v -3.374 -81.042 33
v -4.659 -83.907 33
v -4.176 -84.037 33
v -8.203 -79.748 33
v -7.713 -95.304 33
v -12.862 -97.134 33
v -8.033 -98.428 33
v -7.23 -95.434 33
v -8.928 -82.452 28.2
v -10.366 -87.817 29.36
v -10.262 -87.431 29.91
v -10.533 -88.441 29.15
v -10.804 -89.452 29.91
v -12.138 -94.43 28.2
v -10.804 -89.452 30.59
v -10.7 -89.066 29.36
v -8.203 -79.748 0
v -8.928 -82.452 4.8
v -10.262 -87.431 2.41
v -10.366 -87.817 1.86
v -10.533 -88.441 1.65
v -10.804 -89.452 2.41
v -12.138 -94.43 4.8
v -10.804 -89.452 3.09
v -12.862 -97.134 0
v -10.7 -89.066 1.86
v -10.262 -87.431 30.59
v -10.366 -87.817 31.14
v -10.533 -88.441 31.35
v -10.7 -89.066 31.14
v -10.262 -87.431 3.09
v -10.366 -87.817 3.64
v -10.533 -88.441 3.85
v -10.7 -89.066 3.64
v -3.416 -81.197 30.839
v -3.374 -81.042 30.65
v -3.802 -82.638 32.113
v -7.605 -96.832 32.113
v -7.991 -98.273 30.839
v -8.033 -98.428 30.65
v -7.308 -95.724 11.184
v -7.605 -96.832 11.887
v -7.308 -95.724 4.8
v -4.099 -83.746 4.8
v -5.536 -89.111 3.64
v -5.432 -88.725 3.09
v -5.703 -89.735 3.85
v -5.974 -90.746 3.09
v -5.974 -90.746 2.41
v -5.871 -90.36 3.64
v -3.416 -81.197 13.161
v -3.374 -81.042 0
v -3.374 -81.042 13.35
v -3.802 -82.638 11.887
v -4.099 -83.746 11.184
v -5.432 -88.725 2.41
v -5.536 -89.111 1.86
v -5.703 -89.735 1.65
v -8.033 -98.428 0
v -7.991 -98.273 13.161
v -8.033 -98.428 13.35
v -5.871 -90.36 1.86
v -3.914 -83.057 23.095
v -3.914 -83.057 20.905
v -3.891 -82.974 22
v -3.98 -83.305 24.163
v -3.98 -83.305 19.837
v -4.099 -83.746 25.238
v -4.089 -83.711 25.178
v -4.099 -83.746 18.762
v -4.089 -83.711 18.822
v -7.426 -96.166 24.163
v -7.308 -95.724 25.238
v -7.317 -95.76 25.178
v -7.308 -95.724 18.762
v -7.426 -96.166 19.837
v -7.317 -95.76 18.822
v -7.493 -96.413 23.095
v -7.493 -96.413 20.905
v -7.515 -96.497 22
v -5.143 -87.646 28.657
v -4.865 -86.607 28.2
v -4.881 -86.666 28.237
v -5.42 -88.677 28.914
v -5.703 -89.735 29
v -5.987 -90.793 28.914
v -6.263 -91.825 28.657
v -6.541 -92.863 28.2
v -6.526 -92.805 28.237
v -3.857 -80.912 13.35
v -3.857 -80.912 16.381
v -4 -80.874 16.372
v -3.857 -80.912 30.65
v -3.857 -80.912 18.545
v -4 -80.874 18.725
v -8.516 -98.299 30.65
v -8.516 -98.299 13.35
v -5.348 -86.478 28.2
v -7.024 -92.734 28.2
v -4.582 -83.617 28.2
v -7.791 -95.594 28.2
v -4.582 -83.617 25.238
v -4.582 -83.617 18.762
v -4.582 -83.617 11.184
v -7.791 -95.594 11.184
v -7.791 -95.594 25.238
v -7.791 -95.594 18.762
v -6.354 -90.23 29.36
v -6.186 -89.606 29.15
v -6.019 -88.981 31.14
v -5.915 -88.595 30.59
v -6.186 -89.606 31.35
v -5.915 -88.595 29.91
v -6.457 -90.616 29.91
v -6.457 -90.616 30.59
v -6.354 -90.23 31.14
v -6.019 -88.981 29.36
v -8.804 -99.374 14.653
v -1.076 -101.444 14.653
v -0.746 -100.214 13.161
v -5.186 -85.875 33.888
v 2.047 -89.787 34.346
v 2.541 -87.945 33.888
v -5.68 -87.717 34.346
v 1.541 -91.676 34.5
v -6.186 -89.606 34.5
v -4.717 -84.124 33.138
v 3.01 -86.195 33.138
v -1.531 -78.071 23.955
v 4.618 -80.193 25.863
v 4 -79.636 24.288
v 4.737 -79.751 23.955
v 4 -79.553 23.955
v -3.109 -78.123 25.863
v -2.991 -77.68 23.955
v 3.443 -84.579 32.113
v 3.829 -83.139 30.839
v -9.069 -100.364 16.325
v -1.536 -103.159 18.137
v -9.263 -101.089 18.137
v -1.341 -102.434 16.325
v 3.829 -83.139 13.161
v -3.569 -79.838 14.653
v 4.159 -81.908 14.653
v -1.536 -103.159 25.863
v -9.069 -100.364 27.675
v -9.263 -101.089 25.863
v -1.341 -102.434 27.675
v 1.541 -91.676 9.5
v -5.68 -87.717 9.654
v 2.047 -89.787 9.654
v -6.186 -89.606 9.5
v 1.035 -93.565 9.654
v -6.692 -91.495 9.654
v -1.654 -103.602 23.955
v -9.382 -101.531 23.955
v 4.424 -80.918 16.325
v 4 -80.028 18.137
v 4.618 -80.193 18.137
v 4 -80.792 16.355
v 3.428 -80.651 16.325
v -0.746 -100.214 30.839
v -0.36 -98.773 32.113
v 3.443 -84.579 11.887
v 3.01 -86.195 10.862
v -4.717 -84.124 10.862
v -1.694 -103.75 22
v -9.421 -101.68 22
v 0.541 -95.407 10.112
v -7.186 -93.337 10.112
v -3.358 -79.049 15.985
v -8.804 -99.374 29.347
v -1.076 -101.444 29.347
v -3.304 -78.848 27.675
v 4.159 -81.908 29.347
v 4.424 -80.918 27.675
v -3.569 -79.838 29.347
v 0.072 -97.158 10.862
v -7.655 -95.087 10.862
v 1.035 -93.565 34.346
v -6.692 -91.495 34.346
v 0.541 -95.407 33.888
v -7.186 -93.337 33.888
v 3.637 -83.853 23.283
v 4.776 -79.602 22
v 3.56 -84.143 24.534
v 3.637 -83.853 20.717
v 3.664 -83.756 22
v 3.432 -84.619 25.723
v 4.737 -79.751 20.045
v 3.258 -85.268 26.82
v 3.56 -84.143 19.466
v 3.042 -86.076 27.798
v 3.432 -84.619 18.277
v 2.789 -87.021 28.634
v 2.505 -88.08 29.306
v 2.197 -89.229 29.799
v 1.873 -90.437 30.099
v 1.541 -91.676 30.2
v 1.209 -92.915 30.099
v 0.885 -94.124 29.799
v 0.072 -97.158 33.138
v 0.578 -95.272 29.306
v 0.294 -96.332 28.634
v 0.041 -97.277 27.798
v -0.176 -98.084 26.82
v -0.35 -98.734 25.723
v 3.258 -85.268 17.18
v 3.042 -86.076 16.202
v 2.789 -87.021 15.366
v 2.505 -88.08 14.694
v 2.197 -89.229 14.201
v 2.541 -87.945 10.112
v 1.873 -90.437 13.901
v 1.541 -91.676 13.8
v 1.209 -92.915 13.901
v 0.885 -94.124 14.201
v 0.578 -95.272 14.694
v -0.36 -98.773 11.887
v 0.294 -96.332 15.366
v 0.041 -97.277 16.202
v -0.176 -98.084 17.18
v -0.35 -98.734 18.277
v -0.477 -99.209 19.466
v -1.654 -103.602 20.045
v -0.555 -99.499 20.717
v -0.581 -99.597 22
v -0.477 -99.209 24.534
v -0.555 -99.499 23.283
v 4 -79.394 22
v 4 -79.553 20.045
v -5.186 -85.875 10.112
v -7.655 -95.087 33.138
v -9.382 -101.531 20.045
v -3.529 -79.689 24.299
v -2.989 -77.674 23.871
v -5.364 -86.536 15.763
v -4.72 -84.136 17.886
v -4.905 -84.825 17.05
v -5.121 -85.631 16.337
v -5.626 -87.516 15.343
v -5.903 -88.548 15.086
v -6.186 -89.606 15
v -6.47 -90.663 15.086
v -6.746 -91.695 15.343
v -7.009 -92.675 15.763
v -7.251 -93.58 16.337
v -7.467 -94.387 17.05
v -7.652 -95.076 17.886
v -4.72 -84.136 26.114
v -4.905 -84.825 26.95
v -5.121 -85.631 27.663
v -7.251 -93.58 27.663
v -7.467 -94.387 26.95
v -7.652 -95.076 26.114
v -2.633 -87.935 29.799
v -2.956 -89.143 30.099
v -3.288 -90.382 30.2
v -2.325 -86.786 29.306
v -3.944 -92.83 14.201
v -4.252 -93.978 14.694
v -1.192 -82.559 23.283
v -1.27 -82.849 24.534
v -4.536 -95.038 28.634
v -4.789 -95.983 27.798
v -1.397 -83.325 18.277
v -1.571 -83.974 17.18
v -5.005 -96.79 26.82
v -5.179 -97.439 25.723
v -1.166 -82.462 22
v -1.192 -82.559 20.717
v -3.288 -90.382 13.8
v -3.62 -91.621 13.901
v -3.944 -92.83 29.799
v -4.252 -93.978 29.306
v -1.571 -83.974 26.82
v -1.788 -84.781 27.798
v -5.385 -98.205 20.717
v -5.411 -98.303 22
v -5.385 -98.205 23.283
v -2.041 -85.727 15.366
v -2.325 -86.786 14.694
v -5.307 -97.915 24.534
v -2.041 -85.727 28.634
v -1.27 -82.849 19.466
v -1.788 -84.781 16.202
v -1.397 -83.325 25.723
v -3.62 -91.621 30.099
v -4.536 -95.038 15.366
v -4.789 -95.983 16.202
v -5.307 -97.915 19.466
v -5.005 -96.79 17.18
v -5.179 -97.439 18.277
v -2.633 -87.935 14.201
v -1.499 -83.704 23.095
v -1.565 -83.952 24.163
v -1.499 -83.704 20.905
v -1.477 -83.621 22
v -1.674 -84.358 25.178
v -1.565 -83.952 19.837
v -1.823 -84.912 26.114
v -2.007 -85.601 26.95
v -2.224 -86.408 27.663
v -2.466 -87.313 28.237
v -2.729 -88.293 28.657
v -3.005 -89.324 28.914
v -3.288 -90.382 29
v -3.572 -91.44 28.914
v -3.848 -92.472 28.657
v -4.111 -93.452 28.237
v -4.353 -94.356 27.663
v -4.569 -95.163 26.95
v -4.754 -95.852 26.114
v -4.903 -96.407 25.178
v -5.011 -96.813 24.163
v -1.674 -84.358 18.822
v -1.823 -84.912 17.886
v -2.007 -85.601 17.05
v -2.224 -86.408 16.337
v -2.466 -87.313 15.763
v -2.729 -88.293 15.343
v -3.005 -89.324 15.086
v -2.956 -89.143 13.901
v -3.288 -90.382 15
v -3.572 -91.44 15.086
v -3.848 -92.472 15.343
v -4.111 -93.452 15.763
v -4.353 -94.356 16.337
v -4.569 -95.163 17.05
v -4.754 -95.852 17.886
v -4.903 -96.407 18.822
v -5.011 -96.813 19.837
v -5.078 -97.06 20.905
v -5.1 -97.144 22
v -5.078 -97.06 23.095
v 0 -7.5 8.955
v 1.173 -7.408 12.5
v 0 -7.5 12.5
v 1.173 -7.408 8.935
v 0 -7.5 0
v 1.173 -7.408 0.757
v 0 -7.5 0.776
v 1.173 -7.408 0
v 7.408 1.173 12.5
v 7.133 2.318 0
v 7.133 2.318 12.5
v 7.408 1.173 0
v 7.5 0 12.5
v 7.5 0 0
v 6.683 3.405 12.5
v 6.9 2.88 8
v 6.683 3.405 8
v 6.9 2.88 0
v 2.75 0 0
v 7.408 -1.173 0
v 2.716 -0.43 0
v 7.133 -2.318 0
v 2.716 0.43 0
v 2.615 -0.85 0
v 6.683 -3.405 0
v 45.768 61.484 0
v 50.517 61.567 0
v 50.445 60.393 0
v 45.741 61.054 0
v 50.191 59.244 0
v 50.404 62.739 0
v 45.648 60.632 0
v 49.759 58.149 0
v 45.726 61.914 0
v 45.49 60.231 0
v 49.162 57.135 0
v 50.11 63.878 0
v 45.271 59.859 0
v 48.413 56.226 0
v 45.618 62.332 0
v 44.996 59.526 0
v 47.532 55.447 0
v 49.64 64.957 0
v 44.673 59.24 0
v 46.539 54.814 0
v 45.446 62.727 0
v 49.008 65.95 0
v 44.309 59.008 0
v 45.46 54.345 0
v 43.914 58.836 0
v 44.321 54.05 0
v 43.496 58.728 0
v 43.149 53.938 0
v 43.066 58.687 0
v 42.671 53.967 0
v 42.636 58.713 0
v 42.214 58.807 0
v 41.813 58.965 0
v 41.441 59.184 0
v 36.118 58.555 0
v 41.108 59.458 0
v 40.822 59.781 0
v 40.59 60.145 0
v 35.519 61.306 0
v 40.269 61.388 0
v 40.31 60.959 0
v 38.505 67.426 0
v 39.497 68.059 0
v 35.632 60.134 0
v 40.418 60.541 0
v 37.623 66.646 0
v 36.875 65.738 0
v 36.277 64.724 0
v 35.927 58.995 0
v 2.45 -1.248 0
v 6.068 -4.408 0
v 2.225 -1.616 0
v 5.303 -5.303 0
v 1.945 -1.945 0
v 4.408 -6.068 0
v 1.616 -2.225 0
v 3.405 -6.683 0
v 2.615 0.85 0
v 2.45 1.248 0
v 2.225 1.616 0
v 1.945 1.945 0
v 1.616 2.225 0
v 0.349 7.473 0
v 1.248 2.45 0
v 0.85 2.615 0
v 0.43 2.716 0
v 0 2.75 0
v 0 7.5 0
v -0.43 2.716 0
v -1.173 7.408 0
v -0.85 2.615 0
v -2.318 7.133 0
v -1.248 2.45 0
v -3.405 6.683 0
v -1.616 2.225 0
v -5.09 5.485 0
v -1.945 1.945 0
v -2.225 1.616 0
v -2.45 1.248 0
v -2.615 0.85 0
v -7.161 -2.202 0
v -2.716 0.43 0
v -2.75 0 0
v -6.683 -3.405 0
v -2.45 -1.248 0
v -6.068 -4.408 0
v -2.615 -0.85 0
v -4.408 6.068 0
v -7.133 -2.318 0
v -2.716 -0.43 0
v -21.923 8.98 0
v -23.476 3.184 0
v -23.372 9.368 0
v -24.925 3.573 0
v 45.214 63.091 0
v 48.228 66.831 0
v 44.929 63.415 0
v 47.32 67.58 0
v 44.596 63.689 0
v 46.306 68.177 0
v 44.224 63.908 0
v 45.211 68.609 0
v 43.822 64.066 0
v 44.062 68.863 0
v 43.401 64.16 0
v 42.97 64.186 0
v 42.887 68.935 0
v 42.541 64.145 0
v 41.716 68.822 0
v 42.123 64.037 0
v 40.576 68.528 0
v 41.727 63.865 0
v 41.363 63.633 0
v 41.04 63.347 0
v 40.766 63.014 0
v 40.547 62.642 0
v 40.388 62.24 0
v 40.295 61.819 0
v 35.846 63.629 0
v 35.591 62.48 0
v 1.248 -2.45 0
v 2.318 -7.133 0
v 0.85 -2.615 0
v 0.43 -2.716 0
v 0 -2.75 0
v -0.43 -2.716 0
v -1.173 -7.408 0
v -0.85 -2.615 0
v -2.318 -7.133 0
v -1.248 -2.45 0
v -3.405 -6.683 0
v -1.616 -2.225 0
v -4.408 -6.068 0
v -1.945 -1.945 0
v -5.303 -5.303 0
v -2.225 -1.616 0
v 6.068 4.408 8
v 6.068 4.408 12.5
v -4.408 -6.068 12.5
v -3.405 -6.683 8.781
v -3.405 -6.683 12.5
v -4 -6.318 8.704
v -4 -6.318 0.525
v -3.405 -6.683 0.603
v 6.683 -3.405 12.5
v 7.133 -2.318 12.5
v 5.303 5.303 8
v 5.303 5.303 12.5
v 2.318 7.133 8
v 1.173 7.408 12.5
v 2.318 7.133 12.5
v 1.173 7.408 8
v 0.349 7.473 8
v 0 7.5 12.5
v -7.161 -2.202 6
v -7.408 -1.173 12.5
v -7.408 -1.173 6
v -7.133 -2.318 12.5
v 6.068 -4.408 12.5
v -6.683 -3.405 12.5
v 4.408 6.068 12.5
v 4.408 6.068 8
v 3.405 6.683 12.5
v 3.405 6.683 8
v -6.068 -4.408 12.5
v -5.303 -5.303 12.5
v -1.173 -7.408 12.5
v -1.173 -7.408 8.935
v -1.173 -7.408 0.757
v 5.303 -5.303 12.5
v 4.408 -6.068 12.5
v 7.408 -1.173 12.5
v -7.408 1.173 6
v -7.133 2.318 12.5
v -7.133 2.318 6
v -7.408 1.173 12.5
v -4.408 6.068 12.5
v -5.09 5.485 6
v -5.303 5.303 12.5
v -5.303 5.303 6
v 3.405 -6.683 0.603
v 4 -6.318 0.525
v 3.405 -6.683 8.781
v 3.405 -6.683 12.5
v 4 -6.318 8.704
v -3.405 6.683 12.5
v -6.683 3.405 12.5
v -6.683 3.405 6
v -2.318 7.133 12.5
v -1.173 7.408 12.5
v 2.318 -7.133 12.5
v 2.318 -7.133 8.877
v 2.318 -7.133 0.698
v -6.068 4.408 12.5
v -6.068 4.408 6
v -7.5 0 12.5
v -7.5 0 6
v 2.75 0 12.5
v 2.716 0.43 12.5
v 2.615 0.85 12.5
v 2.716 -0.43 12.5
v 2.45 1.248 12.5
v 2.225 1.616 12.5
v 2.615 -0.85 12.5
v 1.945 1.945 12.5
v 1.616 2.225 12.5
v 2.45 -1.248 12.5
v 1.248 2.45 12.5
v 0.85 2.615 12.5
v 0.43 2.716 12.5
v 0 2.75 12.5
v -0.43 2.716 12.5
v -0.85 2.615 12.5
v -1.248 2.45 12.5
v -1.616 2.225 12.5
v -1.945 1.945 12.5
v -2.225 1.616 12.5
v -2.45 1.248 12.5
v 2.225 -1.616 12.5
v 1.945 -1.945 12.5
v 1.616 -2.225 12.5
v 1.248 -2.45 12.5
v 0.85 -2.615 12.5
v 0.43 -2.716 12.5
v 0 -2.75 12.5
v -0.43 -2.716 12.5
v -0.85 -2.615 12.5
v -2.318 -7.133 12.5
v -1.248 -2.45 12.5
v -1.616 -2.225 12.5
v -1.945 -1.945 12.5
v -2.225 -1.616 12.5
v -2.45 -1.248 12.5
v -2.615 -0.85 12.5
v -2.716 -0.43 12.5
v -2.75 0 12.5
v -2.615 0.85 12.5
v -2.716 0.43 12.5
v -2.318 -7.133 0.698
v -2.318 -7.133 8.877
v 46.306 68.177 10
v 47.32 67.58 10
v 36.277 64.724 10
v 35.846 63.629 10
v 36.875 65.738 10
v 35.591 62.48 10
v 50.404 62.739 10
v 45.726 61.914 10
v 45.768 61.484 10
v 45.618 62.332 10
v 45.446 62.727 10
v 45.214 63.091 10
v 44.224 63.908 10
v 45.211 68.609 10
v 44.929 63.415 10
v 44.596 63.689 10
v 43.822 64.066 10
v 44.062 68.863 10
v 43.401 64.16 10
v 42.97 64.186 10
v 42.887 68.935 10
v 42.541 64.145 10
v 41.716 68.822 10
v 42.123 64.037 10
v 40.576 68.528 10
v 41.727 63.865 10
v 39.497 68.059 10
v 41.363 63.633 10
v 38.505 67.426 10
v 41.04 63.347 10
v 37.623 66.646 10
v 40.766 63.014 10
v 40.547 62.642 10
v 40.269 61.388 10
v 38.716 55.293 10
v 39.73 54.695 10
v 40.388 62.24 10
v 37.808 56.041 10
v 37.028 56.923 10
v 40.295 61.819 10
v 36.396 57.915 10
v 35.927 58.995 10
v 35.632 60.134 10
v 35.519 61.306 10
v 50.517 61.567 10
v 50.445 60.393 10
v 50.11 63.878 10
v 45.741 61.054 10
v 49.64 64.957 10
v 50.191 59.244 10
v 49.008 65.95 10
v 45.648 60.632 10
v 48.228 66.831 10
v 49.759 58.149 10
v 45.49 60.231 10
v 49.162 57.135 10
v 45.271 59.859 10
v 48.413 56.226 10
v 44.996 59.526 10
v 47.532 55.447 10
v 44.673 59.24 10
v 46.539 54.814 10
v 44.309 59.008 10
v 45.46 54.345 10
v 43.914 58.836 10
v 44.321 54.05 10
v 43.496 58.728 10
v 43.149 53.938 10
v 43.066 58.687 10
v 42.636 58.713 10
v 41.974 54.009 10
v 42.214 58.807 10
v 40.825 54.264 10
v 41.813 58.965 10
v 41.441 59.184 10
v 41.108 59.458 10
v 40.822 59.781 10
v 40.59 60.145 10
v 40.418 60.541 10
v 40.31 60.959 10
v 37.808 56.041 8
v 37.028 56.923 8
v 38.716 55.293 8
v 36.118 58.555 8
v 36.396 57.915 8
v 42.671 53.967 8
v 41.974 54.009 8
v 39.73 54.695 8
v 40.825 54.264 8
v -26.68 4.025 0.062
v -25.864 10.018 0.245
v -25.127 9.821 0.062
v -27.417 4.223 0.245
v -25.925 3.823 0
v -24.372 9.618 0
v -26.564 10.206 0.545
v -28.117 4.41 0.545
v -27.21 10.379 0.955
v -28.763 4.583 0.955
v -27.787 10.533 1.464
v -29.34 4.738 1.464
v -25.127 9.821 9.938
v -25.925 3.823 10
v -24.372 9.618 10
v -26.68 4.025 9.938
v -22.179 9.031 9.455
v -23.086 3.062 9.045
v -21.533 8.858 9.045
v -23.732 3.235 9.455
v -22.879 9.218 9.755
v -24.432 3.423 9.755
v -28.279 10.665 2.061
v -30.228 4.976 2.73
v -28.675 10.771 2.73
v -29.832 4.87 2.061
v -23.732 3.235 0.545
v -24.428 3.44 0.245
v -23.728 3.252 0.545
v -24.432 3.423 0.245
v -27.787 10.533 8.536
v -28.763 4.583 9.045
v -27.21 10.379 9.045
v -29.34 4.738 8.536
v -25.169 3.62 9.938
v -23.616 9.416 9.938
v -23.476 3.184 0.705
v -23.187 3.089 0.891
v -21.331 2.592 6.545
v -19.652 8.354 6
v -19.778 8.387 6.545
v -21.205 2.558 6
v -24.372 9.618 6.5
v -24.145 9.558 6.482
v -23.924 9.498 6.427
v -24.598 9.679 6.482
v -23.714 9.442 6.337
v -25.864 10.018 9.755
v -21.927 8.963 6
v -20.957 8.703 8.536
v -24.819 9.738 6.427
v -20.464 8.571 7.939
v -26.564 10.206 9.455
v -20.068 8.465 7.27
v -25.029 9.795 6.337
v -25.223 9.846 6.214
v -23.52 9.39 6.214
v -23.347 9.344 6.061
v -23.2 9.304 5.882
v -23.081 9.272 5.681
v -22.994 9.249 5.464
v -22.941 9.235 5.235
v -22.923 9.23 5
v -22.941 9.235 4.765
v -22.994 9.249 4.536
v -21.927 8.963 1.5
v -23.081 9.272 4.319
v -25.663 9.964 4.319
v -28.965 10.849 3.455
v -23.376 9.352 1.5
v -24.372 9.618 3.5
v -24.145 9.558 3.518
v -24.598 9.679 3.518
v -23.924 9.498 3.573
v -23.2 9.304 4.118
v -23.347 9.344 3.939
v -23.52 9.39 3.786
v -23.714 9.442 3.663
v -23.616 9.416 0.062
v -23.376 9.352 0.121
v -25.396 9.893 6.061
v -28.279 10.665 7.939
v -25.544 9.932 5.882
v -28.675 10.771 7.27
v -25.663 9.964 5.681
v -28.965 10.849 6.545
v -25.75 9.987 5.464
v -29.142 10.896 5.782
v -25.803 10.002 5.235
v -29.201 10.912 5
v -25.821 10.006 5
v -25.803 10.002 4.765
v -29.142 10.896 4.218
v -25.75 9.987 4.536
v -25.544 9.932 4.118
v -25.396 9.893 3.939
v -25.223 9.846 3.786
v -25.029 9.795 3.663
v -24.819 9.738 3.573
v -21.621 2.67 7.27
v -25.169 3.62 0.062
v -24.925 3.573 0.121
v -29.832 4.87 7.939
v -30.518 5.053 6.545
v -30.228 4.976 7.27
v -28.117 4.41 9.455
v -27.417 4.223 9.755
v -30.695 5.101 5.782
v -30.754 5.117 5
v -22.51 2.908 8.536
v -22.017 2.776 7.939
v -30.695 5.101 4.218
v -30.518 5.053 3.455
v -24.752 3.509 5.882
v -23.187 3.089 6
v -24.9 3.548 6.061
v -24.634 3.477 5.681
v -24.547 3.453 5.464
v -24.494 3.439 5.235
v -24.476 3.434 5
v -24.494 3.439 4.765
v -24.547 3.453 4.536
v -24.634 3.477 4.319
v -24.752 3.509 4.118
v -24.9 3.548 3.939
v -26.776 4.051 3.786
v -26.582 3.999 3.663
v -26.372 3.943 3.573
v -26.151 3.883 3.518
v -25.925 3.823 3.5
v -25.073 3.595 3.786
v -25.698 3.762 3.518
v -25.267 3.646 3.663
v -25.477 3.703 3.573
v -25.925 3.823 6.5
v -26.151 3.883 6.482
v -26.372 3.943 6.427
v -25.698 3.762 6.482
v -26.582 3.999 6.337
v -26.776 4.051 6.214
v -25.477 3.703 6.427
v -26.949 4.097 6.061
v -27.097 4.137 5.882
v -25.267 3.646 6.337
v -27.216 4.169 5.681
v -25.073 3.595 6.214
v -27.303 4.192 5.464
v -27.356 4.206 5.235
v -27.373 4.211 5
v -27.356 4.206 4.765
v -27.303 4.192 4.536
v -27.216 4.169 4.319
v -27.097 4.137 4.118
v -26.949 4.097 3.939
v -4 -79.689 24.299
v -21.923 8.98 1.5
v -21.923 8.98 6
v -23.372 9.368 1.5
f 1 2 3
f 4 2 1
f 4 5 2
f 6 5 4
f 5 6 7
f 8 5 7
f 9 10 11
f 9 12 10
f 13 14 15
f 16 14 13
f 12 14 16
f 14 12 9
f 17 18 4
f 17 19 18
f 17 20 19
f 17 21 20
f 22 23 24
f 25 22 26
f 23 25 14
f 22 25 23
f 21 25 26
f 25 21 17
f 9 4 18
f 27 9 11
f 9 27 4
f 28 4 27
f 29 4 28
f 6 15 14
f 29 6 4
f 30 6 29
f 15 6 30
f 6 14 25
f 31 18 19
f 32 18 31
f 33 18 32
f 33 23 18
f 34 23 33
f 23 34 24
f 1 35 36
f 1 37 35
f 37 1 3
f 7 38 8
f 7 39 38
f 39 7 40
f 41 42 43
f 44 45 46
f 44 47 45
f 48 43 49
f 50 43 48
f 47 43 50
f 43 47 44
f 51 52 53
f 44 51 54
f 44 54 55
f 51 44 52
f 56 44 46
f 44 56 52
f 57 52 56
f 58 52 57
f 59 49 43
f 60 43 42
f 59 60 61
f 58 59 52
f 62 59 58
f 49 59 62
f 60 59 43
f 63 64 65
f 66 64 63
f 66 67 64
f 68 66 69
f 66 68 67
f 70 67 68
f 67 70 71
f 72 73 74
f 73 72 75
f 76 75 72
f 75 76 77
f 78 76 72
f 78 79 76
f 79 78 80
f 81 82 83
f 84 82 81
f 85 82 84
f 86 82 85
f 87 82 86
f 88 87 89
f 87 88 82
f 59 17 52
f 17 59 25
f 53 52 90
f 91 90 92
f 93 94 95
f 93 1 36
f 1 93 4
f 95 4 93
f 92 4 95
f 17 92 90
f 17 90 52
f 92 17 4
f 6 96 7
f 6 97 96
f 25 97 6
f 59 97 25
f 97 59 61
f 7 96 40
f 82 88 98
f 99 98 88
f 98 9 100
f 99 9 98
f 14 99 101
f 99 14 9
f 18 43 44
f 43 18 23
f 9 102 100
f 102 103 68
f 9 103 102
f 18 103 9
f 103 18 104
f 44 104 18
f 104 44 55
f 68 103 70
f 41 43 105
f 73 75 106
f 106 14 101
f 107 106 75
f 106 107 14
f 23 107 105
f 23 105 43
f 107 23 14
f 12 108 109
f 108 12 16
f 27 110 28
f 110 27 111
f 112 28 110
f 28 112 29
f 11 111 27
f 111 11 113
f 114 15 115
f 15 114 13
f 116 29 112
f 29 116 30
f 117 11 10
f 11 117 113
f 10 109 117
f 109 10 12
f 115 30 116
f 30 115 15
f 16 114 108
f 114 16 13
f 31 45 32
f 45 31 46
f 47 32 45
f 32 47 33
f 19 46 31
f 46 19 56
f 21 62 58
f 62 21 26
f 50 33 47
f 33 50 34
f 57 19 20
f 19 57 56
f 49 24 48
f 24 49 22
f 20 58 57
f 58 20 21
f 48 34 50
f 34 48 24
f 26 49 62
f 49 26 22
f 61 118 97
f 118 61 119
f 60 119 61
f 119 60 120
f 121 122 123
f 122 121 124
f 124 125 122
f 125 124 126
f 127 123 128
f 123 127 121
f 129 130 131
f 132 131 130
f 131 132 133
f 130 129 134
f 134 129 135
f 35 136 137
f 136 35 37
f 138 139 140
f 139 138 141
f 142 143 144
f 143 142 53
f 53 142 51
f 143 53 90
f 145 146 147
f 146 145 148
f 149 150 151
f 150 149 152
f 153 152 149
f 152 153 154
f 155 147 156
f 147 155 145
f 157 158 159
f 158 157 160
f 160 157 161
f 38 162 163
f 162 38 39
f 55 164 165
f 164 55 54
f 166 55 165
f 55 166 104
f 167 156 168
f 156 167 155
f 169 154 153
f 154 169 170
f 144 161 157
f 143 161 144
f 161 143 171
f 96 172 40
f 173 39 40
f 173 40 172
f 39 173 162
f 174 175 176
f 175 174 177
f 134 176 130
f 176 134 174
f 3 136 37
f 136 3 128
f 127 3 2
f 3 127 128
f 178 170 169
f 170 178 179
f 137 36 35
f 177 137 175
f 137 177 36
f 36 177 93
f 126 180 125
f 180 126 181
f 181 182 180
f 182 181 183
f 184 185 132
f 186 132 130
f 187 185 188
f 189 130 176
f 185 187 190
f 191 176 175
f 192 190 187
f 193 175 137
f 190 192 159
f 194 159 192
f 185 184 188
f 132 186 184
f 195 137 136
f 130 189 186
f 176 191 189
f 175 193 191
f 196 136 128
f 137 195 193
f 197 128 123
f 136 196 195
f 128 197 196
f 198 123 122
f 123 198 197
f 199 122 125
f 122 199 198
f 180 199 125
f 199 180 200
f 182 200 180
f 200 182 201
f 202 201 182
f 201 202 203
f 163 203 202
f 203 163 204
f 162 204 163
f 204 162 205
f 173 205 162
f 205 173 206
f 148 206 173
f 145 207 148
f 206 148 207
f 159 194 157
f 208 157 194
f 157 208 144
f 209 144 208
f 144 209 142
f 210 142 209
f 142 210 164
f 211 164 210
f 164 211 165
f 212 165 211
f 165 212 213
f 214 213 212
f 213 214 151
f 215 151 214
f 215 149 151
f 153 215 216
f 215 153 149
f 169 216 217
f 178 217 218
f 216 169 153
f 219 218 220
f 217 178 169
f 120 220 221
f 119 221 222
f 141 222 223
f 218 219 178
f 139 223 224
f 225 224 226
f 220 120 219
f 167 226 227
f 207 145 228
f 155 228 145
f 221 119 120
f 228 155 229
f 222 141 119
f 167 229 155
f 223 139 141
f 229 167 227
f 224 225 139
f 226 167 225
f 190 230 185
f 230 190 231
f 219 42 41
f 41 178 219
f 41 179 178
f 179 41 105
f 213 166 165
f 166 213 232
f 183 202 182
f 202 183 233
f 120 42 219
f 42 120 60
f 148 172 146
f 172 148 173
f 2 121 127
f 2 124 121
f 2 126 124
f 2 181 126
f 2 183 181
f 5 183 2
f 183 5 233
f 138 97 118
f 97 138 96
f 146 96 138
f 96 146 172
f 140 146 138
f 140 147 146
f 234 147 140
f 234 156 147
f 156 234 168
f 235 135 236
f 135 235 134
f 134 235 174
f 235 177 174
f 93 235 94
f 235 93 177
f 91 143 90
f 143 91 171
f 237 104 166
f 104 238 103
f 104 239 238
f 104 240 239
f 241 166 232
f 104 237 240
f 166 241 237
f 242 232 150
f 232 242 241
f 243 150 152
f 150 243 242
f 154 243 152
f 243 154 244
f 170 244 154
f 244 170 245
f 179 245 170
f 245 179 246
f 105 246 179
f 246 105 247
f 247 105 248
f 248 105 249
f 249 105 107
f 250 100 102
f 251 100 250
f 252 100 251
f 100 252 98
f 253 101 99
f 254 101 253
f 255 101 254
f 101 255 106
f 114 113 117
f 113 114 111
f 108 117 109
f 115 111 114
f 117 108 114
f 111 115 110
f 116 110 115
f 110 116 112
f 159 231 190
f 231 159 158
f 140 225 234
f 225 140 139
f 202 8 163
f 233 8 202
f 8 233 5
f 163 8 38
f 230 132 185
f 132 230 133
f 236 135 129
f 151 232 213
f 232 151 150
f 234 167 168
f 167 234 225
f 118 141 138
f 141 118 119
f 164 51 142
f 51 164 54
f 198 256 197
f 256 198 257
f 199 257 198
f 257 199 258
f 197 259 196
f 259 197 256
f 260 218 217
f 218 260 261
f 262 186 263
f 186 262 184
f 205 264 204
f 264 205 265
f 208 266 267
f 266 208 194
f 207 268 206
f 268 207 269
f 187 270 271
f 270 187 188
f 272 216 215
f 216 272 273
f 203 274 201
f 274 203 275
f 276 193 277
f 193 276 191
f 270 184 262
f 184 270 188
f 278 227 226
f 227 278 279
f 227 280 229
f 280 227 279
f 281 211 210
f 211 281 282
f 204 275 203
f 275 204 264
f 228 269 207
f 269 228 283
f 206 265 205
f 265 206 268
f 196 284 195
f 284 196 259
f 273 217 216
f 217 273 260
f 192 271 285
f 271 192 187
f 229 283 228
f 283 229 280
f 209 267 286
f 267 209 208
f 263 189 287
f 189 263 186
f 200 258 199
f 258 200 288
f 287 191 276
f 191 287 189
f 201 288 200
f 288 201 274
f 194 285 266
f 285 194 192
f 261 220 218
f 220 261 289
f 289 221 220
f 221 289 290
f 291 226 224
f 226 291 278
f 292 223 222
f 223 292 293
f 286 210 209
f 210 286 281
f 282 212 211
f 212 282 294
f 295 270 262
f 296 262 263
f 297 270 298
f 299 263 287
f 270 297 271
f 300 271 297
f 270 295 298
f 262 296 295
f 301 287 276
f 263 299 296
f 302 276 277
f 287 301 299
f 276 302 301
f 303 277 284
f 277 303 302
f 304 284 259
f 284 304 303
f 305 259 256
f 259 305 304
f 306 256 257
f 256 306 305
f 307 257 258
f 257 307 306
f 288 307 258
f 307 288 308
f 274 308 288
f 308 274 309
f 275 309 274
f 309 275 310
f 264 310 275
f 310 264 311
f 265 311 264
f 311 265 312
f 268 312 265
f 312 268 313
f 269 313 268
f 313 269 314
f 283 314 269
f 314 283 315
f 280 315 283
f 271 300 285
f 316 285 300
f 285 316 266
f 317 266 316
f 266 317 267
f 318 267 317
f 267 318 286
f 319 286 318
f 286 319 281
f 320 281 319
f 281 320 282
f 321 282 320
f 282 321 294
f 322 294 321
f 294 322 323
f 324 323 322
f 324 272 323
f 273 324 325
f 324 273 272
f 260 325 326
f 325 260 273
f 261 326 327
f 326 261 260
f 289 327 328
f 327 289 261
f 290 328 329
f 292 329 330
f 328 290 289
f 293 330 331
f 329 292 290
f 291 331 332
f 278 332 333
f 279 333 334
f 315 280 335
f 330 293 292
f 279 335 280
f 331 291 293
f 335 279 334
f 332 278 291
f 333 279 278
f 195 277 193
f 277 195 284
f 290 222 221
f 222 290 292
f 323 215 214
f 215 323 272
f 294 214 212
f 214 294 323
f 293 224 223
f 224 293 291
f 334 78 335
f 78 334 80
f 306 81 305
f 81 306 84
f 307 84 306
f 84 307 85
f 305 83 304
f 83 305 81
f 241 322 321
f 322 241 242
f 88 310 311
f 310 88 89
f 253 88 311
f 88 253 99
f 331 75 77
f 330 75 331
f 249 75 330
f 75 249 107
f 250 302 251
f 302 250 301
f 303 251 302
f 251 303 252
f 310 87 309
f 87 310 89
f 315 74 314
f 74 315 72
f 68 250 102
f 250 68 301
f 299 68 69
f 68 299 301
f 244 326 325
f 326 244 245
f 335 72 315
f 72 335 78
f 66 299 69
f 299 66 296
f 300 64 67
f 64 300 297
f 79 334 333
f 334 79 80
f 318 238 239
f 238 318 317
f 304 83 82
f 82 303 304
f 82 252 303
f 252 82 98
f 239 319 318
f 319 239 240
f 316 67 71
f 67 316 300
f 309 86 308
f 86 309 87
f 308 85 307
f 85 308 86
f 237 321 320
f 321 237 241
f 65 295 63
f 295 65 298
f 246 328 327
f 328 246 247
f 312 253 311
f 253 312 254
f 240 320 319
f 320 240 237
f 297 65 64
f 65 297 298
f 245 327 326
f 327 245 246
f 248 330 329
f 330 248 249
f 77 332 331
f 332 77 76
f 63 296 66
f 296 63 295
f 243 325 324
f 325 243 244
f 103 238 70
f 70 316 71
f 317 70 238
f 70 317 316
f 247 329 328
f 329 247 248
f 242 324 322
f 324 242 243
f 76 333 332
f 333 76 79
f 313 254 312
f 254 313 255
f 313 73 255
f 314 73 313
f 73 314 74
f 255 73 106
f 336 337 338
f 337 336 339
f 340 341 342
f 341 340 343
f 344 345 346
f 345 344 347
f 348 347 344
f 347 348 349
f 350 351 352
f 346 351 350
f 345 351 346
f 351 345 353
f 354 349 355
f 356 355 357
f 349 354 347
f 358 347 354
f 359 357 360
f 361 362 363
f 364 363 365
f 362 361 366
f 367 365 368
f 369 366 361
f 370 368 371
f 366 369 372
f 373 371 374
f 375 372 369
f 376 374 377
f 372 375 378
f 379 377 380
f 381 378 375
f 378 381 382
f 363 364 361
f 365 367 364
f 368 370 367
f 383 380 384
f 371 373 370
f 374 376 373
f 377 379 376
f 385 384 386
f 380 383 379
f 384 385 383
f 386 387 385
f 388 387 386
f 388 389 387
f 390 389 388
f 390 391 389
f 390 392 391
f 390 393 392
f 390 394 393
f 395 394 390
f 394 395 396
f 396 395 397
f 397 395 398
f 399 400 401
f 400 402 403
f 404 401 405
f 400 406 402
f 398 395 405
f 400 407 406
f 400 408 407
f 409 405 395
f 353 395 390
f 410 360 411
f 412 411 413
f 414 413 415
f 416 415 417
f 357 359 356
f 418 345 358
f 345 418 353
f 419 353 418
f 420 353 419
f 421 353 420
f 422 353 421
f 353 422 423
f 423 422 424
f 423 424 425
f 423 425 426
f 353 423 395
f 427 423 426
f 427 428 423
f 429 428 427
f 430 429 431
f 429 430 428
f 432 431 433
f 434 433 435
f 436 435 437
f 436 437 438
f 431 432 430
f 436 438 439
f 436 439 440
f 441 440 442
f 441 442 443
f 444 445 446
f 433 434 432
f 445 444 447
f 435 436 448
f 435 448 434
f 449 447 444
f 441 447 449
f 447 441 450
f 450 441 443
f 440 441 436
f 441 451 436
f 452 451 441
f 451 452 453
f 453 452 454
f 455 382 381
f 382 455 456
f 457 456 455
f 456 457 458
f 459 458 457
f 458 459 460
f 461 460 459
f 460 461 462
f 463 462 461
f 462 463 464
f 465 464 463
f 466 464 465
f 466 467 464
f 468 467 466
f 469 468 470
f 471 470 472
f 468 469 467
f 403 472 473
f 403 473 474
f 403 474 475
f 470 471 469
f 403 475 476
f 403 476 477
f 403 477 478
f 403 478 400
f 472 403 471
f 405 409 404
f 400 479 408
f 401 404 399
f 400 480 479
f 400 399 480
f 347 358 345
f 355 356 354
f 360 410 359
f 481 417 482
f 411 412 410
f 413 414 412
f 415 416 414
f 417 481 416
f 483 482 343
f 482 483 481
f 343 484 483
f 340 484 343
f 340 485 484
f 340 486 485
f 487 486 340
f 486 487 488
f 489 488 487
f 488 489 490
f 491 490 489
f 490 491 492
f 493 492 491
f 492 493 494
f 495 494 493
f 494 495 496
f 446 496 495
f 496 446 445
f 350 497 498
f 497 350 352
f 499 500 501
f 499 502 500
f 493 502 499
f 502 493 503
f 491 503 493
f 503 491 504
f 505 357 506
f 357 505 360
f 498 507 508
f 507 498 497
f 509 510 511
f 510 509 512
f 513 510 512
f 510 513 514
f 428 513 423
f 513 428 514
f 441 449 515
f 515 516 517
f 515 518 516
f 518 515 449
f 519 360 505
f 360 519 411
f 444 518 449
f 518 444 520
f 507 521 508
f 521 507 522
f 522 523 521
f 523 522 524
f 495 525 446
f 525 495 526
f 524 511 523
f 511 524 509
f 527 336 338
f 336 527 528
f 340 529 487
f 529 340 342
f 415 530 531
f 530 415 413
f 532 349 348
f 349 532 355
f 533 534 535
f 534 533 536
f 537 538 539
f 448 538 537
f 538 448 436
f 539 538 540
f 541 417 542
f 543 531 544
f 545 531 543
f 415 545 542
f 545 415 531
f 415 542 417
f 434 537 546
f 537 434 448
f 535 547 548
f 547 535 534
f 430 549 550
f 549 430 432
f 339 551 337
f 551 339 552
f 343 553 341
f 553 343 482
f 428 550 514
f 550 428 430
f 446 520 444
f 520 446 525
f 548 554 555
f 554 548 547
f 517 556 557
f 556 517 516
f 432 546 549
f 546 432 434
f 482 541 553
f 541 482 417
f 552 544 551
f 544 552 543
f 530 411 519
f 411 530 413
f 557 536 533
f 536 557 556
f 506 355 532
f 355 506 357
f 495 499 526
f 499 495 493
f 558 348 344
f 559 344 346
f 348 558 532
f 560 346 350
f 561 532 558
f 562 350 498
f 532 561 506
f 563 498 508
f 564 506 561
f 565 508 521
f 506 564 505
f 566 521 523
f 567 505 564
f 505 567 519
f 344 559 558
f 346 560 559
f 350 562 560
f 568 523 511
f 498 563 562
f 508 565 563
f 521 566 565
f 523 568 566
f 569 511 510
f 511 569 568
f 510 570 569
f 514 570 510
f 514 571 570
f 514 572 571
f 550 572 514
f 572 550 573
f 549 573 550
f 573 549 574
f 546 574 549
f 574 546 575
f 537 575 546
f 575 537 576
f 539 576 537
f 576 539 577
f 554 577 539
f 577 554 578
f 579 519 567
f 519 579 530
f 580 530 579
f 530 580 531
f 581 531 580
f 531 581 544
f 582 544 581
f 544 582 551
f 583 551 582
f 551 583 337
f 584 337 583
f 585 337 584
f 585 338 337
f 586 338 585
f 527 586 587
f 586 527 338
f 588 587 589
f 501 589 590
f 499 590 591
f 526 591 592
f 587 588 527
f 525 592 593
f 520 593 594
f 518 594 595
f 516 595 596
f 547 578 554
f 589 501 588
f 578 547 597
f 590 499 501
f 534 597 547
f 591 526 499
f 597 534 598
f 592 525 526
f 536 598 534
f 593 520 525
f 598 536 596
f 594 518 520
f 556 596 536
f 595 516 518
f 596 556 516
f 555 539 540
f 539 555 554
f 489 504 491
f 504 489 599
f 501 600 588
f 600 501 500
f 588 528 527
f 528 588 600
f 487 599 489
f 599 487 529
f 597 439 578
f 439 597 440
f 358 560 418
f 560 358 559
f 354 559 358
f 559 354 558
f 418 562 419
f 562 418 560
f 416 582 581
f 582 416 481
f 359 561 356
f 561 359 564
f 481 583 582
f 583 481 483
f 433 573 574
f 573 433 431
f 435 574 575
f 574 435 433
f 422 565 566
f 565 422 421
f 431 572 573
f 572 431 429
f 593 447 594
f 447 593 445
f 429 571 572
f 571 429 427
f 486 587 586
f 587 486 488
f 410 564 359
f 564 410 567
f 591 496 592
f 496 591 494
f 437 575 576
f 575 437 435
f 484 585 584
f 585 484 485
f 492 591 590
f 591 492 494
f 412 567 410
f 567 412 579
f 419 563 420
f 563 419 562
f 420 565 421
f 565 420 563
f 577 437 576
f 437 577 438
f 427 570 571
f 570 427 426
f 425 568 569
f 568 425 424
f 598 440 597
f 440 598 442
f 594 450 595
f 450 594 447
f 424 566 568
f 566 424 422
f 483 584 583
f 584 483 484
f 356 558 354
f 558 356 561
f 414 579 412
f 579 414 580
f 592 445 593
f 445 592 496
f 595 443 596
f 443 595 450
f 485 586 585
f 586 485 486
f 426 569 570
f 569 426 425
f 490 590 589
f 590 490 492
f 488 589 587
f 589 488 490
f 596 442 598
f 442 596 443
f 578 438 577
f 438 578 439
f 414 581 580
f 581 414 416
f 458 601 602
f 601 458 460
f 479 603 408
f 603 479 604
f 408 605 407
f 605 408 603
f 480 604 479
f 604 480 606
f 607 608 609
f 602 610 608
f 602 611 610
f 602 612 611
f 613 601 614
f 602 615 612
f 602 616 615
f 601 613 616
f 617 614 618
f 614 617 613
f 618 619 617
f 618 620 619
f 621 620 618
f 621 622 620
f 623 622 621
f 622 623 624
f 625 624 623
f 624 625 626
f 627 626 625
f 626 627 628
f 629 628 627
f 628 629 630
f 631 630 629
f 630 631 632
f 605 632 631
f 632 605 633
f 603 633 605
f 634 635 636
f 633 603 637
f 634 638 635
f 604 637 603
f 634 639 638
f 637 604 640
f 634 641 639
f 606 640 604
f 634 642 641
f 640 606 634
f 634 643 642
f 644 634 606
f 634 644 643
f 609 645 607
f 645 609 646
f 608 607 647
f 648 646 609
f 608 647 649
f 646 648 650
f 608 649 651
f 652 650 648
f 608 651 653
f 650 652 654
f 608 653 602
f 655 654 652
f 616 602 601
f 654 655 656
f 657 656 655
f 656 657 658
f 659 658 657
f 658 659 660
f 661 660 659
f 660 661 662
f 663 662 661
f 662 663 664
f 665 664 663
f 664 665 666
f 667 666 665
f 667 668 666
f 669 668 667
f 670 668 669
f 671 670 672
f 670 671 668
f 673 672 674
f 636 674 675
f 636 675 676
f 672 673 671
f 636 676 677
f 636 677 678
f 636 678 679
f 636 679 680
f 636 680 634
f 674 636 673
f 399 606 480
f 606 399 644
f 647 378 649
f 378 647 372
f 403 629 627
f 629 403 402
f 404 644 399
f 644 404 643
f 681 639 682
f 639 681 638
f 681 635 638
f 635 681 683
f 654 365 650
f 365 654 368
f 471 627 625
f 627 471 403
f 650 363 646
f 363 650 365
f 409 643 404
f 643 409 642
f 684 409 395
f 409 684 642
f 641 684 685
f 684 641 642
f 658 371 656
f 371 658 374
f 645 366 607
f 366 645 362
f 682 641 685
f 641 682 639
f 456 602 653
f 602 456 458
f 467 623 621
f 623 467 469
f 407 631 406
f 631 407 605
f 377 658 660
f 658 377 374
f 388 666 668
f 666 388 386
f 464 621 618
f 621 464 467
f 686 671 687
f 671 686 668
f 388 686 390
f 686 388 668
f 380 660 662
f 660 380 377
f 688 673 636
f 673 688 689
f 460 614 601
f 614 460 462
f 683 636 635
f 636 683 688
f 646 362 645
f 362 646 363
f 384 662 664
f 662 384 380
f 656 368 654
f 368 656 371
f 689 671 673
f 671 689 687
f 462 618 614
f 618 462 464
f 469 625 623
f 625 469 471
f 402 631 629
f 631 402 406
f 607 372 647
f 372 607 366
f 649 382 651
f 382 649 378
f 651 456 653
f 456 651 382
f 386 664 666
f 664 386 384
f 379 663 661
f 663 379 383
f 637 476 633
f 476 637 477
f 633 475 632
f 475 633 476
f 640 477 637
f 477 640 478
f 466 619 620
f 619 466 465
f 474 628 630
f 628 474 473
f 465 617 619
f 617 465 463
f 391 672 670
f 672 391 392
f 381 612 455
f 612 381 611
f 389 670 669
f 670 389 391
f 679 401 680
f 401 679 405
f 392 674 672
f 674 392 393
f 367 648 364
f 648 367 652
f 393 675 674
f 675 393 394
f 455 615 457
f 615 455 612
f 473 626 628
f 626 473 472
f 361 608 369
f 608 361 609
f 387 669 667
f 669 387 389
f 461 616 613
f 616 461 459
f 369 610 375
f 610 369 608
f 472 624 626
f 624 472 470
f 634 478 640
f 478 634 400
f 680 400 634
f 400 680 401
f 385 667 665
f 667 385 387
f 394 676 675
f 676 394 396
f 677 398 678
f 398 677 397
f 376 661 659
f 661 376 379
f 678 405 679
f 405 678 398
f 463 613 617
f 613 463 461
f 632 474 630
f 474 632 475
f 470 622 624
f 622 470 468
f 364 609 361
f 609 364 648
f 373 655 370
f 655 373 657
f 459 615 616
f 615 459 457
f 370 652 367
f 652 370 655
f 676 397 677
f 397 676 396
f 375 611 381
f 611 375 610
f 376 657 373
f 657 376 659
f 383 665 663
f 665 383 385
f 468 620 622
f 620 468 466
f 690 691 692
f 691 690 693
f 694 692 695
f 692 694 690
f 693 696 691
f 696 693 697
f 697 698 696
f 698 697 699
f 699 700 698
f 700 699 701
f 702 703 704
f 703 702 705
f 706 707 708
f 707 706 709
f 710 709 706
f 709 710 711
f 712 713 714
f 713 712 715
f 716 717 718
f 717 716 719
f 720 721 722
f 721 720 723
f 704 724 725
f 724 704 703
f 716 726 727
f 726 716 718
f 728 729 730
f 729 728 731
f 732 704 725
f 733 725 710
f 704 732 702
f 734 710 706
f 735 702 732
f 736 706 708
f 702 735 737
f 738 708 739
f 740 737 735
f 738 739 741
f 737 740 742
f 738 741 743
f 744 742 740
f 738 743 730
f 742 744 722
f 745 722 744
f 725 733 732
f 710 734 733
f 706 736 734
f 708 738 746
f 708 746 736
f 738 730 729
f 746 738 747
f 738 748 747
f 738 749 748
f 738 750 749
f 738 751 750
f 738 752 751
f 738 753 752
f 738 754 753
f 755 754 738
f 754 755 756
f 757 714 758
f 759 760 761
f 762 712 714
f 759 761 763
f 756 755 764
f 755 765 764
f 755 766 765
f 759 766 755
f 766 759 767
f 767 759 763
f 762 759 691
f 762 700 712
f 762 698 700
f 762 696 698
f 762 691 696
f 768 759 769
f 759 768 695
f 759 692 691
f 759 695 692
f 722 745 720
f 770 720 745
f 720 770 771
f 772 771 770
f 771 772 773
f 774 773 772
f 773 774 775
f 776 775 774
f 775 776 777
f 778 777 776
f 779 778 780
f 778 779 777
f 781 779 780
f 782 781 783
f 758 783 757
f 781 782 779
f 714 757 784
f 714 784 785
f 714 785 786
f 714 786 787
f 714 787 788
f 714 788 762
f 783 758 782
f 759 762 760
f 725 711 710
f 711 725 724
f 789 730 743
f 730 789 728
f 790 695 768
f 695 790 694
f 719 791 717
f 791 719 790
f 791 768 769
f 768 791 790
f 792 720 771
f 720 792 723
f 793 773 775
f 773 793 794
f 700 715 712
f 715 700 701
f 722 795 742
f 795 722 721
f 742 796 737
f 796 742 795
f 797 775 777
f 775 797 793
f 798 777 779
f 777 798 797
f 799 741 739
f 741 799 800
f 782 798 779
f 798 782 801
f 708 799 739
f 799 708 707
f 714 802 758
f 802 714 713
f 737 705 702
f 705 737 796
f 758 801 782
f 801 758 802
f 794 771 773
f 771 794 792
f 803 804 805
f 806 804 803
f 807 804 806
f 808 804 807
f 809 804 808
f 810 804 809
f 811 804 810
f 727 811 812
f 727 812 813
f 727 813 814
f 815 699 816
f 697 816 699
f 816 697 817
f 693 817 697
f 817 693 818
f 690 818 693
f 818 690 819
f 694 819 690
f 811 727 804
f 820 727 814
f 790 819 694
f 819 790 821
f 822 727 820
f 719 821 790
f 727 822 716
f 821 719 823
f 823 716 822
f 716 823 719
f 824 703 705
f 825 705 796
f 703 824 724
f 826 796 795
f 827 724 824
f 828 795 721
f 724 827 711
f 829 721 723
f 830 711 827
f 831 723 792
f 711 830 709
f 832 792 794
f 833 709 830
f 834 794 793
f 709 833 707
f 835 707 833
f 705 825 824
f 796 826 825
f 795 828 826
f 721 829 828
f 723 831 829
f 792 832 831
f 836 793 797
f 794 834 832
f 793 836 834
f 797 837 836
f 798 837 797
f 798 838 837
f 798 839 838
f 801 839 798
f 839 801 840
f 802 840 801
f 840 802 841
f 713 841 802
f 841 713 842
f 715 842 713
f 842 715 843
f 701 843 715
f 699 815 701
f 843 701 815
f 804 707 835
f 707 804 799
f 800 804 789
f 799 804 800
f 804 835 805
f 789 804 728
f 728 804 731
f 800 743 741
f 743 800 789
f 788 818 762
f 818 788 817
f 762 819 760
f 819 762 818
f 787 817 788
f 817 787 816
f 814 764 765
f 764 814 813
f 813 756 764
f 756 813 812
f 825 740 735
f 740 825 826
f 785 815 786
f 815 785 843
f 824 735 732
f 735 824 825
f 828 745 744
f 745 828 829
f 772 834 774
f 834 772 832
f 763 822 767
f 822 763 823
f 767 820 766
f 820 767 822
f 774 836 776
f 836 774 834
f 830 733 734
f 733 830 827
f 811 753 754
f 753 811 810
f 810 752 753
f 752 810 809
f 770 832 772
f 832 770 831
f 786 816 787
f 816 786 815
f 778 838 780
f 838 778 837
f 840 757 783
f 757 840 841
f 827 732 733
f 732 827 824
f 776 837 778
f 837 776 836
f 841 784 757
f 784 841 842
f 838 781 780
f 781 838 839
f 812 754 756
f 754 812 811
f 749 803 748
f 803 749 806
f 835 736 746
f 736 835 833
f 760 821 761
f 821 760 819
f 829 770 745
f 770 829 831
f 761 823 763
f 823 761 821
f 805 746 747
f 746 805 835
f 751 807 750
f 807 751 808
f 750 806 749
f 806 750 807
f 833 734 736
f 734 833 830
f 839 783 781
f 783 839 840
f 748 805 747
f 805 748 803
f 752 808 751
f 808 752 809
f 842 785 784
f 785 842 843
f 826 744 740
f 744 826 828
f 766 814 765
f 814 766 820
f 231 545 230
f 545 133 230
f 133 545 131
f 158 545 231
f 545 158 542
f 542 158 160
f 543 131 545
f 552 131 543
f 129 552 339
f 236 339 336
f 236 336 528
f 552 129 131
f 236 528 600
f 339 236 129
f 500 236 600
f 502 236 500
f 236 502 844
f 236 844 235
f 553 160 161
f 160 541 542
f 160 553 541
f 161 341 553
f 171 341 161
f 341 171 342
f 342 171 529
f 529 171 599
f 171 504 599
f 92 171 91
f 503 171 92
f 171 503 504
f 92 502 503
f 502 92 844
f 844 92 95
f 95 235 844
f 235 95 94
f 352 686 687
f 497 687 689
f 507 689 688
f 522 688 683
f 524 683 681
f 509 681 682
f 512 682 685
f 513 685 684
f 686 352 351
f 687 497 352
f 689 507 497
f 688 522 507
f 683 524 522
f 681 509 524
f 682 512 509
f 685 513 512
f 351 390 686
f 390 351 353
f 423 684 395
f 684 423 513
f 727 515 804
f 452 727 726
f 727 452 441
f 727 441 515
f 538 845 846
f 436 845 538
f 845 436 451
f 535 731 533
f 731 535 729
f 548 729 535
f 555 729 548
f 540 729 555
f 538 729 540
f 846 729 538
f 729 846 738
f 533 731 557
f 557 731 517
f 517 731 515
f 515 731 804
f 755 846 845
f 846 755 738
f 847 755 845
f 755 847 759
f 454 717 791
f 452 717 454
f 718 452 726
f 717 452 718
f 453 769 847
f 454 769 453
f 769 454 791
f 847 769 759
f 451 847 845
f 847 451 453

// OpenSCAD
$fn=40;

translate([4,-82.5,0])rotate([0,-90,-15])
translate([16.5,-9.5,0])
servo_bracket();

rotate([-12,0,0])
translate([-4,-83,-.8])cube([8,78.5,8]);

difference(){
cylinder(d=15,h=12.5);
translate([0,0,-1])cylinder(d=5.5,h=14);
}

rotate([0,0,145])
translate([-4,-70,0])cube([8,64.5,8]);

rotate([0,0,145])translate([0,-75,0])
difference(){
cylinder(d=15,h=10);
translate([0,0,-1])cylinder(d=5.5,h=12);
}

rotate([0,0,75]) translate([0,6,0])
linear_extrude(height=6)
polygon([[-4,0],[4,0],[3,17.5],[-3,17.5]]);

rotate([0,0,75]) translate([-3,19,0])
cube([6,6,1.5]);

translate([-1,0.25,5])rotate([0,0,75]) 
translate([0,25,0])rotate([0,90,0])
difference(){
cylinder(d=10,h=6,center=true);
cylinder(d=3,h=7,center=true);
}

module servo_bracket(){
difference(){
translate([0,0,10])cube([33,18,5],center=true);
cube([23.4,12.4,50],center=true);
translate([13.75,0,-1])cylinder(d=2.2,h=50,$fn=10);
translate([-13.75,0,-1])cylinder(d=2.2,h=50,$fn=10);
}
translate([5.5,0,0])
difference(){
cylinder(d=25,h=8);
cylinder(d=16.4,h=5);
translate([0,0,5])cylinder(d=14,h=3);   
}
}
